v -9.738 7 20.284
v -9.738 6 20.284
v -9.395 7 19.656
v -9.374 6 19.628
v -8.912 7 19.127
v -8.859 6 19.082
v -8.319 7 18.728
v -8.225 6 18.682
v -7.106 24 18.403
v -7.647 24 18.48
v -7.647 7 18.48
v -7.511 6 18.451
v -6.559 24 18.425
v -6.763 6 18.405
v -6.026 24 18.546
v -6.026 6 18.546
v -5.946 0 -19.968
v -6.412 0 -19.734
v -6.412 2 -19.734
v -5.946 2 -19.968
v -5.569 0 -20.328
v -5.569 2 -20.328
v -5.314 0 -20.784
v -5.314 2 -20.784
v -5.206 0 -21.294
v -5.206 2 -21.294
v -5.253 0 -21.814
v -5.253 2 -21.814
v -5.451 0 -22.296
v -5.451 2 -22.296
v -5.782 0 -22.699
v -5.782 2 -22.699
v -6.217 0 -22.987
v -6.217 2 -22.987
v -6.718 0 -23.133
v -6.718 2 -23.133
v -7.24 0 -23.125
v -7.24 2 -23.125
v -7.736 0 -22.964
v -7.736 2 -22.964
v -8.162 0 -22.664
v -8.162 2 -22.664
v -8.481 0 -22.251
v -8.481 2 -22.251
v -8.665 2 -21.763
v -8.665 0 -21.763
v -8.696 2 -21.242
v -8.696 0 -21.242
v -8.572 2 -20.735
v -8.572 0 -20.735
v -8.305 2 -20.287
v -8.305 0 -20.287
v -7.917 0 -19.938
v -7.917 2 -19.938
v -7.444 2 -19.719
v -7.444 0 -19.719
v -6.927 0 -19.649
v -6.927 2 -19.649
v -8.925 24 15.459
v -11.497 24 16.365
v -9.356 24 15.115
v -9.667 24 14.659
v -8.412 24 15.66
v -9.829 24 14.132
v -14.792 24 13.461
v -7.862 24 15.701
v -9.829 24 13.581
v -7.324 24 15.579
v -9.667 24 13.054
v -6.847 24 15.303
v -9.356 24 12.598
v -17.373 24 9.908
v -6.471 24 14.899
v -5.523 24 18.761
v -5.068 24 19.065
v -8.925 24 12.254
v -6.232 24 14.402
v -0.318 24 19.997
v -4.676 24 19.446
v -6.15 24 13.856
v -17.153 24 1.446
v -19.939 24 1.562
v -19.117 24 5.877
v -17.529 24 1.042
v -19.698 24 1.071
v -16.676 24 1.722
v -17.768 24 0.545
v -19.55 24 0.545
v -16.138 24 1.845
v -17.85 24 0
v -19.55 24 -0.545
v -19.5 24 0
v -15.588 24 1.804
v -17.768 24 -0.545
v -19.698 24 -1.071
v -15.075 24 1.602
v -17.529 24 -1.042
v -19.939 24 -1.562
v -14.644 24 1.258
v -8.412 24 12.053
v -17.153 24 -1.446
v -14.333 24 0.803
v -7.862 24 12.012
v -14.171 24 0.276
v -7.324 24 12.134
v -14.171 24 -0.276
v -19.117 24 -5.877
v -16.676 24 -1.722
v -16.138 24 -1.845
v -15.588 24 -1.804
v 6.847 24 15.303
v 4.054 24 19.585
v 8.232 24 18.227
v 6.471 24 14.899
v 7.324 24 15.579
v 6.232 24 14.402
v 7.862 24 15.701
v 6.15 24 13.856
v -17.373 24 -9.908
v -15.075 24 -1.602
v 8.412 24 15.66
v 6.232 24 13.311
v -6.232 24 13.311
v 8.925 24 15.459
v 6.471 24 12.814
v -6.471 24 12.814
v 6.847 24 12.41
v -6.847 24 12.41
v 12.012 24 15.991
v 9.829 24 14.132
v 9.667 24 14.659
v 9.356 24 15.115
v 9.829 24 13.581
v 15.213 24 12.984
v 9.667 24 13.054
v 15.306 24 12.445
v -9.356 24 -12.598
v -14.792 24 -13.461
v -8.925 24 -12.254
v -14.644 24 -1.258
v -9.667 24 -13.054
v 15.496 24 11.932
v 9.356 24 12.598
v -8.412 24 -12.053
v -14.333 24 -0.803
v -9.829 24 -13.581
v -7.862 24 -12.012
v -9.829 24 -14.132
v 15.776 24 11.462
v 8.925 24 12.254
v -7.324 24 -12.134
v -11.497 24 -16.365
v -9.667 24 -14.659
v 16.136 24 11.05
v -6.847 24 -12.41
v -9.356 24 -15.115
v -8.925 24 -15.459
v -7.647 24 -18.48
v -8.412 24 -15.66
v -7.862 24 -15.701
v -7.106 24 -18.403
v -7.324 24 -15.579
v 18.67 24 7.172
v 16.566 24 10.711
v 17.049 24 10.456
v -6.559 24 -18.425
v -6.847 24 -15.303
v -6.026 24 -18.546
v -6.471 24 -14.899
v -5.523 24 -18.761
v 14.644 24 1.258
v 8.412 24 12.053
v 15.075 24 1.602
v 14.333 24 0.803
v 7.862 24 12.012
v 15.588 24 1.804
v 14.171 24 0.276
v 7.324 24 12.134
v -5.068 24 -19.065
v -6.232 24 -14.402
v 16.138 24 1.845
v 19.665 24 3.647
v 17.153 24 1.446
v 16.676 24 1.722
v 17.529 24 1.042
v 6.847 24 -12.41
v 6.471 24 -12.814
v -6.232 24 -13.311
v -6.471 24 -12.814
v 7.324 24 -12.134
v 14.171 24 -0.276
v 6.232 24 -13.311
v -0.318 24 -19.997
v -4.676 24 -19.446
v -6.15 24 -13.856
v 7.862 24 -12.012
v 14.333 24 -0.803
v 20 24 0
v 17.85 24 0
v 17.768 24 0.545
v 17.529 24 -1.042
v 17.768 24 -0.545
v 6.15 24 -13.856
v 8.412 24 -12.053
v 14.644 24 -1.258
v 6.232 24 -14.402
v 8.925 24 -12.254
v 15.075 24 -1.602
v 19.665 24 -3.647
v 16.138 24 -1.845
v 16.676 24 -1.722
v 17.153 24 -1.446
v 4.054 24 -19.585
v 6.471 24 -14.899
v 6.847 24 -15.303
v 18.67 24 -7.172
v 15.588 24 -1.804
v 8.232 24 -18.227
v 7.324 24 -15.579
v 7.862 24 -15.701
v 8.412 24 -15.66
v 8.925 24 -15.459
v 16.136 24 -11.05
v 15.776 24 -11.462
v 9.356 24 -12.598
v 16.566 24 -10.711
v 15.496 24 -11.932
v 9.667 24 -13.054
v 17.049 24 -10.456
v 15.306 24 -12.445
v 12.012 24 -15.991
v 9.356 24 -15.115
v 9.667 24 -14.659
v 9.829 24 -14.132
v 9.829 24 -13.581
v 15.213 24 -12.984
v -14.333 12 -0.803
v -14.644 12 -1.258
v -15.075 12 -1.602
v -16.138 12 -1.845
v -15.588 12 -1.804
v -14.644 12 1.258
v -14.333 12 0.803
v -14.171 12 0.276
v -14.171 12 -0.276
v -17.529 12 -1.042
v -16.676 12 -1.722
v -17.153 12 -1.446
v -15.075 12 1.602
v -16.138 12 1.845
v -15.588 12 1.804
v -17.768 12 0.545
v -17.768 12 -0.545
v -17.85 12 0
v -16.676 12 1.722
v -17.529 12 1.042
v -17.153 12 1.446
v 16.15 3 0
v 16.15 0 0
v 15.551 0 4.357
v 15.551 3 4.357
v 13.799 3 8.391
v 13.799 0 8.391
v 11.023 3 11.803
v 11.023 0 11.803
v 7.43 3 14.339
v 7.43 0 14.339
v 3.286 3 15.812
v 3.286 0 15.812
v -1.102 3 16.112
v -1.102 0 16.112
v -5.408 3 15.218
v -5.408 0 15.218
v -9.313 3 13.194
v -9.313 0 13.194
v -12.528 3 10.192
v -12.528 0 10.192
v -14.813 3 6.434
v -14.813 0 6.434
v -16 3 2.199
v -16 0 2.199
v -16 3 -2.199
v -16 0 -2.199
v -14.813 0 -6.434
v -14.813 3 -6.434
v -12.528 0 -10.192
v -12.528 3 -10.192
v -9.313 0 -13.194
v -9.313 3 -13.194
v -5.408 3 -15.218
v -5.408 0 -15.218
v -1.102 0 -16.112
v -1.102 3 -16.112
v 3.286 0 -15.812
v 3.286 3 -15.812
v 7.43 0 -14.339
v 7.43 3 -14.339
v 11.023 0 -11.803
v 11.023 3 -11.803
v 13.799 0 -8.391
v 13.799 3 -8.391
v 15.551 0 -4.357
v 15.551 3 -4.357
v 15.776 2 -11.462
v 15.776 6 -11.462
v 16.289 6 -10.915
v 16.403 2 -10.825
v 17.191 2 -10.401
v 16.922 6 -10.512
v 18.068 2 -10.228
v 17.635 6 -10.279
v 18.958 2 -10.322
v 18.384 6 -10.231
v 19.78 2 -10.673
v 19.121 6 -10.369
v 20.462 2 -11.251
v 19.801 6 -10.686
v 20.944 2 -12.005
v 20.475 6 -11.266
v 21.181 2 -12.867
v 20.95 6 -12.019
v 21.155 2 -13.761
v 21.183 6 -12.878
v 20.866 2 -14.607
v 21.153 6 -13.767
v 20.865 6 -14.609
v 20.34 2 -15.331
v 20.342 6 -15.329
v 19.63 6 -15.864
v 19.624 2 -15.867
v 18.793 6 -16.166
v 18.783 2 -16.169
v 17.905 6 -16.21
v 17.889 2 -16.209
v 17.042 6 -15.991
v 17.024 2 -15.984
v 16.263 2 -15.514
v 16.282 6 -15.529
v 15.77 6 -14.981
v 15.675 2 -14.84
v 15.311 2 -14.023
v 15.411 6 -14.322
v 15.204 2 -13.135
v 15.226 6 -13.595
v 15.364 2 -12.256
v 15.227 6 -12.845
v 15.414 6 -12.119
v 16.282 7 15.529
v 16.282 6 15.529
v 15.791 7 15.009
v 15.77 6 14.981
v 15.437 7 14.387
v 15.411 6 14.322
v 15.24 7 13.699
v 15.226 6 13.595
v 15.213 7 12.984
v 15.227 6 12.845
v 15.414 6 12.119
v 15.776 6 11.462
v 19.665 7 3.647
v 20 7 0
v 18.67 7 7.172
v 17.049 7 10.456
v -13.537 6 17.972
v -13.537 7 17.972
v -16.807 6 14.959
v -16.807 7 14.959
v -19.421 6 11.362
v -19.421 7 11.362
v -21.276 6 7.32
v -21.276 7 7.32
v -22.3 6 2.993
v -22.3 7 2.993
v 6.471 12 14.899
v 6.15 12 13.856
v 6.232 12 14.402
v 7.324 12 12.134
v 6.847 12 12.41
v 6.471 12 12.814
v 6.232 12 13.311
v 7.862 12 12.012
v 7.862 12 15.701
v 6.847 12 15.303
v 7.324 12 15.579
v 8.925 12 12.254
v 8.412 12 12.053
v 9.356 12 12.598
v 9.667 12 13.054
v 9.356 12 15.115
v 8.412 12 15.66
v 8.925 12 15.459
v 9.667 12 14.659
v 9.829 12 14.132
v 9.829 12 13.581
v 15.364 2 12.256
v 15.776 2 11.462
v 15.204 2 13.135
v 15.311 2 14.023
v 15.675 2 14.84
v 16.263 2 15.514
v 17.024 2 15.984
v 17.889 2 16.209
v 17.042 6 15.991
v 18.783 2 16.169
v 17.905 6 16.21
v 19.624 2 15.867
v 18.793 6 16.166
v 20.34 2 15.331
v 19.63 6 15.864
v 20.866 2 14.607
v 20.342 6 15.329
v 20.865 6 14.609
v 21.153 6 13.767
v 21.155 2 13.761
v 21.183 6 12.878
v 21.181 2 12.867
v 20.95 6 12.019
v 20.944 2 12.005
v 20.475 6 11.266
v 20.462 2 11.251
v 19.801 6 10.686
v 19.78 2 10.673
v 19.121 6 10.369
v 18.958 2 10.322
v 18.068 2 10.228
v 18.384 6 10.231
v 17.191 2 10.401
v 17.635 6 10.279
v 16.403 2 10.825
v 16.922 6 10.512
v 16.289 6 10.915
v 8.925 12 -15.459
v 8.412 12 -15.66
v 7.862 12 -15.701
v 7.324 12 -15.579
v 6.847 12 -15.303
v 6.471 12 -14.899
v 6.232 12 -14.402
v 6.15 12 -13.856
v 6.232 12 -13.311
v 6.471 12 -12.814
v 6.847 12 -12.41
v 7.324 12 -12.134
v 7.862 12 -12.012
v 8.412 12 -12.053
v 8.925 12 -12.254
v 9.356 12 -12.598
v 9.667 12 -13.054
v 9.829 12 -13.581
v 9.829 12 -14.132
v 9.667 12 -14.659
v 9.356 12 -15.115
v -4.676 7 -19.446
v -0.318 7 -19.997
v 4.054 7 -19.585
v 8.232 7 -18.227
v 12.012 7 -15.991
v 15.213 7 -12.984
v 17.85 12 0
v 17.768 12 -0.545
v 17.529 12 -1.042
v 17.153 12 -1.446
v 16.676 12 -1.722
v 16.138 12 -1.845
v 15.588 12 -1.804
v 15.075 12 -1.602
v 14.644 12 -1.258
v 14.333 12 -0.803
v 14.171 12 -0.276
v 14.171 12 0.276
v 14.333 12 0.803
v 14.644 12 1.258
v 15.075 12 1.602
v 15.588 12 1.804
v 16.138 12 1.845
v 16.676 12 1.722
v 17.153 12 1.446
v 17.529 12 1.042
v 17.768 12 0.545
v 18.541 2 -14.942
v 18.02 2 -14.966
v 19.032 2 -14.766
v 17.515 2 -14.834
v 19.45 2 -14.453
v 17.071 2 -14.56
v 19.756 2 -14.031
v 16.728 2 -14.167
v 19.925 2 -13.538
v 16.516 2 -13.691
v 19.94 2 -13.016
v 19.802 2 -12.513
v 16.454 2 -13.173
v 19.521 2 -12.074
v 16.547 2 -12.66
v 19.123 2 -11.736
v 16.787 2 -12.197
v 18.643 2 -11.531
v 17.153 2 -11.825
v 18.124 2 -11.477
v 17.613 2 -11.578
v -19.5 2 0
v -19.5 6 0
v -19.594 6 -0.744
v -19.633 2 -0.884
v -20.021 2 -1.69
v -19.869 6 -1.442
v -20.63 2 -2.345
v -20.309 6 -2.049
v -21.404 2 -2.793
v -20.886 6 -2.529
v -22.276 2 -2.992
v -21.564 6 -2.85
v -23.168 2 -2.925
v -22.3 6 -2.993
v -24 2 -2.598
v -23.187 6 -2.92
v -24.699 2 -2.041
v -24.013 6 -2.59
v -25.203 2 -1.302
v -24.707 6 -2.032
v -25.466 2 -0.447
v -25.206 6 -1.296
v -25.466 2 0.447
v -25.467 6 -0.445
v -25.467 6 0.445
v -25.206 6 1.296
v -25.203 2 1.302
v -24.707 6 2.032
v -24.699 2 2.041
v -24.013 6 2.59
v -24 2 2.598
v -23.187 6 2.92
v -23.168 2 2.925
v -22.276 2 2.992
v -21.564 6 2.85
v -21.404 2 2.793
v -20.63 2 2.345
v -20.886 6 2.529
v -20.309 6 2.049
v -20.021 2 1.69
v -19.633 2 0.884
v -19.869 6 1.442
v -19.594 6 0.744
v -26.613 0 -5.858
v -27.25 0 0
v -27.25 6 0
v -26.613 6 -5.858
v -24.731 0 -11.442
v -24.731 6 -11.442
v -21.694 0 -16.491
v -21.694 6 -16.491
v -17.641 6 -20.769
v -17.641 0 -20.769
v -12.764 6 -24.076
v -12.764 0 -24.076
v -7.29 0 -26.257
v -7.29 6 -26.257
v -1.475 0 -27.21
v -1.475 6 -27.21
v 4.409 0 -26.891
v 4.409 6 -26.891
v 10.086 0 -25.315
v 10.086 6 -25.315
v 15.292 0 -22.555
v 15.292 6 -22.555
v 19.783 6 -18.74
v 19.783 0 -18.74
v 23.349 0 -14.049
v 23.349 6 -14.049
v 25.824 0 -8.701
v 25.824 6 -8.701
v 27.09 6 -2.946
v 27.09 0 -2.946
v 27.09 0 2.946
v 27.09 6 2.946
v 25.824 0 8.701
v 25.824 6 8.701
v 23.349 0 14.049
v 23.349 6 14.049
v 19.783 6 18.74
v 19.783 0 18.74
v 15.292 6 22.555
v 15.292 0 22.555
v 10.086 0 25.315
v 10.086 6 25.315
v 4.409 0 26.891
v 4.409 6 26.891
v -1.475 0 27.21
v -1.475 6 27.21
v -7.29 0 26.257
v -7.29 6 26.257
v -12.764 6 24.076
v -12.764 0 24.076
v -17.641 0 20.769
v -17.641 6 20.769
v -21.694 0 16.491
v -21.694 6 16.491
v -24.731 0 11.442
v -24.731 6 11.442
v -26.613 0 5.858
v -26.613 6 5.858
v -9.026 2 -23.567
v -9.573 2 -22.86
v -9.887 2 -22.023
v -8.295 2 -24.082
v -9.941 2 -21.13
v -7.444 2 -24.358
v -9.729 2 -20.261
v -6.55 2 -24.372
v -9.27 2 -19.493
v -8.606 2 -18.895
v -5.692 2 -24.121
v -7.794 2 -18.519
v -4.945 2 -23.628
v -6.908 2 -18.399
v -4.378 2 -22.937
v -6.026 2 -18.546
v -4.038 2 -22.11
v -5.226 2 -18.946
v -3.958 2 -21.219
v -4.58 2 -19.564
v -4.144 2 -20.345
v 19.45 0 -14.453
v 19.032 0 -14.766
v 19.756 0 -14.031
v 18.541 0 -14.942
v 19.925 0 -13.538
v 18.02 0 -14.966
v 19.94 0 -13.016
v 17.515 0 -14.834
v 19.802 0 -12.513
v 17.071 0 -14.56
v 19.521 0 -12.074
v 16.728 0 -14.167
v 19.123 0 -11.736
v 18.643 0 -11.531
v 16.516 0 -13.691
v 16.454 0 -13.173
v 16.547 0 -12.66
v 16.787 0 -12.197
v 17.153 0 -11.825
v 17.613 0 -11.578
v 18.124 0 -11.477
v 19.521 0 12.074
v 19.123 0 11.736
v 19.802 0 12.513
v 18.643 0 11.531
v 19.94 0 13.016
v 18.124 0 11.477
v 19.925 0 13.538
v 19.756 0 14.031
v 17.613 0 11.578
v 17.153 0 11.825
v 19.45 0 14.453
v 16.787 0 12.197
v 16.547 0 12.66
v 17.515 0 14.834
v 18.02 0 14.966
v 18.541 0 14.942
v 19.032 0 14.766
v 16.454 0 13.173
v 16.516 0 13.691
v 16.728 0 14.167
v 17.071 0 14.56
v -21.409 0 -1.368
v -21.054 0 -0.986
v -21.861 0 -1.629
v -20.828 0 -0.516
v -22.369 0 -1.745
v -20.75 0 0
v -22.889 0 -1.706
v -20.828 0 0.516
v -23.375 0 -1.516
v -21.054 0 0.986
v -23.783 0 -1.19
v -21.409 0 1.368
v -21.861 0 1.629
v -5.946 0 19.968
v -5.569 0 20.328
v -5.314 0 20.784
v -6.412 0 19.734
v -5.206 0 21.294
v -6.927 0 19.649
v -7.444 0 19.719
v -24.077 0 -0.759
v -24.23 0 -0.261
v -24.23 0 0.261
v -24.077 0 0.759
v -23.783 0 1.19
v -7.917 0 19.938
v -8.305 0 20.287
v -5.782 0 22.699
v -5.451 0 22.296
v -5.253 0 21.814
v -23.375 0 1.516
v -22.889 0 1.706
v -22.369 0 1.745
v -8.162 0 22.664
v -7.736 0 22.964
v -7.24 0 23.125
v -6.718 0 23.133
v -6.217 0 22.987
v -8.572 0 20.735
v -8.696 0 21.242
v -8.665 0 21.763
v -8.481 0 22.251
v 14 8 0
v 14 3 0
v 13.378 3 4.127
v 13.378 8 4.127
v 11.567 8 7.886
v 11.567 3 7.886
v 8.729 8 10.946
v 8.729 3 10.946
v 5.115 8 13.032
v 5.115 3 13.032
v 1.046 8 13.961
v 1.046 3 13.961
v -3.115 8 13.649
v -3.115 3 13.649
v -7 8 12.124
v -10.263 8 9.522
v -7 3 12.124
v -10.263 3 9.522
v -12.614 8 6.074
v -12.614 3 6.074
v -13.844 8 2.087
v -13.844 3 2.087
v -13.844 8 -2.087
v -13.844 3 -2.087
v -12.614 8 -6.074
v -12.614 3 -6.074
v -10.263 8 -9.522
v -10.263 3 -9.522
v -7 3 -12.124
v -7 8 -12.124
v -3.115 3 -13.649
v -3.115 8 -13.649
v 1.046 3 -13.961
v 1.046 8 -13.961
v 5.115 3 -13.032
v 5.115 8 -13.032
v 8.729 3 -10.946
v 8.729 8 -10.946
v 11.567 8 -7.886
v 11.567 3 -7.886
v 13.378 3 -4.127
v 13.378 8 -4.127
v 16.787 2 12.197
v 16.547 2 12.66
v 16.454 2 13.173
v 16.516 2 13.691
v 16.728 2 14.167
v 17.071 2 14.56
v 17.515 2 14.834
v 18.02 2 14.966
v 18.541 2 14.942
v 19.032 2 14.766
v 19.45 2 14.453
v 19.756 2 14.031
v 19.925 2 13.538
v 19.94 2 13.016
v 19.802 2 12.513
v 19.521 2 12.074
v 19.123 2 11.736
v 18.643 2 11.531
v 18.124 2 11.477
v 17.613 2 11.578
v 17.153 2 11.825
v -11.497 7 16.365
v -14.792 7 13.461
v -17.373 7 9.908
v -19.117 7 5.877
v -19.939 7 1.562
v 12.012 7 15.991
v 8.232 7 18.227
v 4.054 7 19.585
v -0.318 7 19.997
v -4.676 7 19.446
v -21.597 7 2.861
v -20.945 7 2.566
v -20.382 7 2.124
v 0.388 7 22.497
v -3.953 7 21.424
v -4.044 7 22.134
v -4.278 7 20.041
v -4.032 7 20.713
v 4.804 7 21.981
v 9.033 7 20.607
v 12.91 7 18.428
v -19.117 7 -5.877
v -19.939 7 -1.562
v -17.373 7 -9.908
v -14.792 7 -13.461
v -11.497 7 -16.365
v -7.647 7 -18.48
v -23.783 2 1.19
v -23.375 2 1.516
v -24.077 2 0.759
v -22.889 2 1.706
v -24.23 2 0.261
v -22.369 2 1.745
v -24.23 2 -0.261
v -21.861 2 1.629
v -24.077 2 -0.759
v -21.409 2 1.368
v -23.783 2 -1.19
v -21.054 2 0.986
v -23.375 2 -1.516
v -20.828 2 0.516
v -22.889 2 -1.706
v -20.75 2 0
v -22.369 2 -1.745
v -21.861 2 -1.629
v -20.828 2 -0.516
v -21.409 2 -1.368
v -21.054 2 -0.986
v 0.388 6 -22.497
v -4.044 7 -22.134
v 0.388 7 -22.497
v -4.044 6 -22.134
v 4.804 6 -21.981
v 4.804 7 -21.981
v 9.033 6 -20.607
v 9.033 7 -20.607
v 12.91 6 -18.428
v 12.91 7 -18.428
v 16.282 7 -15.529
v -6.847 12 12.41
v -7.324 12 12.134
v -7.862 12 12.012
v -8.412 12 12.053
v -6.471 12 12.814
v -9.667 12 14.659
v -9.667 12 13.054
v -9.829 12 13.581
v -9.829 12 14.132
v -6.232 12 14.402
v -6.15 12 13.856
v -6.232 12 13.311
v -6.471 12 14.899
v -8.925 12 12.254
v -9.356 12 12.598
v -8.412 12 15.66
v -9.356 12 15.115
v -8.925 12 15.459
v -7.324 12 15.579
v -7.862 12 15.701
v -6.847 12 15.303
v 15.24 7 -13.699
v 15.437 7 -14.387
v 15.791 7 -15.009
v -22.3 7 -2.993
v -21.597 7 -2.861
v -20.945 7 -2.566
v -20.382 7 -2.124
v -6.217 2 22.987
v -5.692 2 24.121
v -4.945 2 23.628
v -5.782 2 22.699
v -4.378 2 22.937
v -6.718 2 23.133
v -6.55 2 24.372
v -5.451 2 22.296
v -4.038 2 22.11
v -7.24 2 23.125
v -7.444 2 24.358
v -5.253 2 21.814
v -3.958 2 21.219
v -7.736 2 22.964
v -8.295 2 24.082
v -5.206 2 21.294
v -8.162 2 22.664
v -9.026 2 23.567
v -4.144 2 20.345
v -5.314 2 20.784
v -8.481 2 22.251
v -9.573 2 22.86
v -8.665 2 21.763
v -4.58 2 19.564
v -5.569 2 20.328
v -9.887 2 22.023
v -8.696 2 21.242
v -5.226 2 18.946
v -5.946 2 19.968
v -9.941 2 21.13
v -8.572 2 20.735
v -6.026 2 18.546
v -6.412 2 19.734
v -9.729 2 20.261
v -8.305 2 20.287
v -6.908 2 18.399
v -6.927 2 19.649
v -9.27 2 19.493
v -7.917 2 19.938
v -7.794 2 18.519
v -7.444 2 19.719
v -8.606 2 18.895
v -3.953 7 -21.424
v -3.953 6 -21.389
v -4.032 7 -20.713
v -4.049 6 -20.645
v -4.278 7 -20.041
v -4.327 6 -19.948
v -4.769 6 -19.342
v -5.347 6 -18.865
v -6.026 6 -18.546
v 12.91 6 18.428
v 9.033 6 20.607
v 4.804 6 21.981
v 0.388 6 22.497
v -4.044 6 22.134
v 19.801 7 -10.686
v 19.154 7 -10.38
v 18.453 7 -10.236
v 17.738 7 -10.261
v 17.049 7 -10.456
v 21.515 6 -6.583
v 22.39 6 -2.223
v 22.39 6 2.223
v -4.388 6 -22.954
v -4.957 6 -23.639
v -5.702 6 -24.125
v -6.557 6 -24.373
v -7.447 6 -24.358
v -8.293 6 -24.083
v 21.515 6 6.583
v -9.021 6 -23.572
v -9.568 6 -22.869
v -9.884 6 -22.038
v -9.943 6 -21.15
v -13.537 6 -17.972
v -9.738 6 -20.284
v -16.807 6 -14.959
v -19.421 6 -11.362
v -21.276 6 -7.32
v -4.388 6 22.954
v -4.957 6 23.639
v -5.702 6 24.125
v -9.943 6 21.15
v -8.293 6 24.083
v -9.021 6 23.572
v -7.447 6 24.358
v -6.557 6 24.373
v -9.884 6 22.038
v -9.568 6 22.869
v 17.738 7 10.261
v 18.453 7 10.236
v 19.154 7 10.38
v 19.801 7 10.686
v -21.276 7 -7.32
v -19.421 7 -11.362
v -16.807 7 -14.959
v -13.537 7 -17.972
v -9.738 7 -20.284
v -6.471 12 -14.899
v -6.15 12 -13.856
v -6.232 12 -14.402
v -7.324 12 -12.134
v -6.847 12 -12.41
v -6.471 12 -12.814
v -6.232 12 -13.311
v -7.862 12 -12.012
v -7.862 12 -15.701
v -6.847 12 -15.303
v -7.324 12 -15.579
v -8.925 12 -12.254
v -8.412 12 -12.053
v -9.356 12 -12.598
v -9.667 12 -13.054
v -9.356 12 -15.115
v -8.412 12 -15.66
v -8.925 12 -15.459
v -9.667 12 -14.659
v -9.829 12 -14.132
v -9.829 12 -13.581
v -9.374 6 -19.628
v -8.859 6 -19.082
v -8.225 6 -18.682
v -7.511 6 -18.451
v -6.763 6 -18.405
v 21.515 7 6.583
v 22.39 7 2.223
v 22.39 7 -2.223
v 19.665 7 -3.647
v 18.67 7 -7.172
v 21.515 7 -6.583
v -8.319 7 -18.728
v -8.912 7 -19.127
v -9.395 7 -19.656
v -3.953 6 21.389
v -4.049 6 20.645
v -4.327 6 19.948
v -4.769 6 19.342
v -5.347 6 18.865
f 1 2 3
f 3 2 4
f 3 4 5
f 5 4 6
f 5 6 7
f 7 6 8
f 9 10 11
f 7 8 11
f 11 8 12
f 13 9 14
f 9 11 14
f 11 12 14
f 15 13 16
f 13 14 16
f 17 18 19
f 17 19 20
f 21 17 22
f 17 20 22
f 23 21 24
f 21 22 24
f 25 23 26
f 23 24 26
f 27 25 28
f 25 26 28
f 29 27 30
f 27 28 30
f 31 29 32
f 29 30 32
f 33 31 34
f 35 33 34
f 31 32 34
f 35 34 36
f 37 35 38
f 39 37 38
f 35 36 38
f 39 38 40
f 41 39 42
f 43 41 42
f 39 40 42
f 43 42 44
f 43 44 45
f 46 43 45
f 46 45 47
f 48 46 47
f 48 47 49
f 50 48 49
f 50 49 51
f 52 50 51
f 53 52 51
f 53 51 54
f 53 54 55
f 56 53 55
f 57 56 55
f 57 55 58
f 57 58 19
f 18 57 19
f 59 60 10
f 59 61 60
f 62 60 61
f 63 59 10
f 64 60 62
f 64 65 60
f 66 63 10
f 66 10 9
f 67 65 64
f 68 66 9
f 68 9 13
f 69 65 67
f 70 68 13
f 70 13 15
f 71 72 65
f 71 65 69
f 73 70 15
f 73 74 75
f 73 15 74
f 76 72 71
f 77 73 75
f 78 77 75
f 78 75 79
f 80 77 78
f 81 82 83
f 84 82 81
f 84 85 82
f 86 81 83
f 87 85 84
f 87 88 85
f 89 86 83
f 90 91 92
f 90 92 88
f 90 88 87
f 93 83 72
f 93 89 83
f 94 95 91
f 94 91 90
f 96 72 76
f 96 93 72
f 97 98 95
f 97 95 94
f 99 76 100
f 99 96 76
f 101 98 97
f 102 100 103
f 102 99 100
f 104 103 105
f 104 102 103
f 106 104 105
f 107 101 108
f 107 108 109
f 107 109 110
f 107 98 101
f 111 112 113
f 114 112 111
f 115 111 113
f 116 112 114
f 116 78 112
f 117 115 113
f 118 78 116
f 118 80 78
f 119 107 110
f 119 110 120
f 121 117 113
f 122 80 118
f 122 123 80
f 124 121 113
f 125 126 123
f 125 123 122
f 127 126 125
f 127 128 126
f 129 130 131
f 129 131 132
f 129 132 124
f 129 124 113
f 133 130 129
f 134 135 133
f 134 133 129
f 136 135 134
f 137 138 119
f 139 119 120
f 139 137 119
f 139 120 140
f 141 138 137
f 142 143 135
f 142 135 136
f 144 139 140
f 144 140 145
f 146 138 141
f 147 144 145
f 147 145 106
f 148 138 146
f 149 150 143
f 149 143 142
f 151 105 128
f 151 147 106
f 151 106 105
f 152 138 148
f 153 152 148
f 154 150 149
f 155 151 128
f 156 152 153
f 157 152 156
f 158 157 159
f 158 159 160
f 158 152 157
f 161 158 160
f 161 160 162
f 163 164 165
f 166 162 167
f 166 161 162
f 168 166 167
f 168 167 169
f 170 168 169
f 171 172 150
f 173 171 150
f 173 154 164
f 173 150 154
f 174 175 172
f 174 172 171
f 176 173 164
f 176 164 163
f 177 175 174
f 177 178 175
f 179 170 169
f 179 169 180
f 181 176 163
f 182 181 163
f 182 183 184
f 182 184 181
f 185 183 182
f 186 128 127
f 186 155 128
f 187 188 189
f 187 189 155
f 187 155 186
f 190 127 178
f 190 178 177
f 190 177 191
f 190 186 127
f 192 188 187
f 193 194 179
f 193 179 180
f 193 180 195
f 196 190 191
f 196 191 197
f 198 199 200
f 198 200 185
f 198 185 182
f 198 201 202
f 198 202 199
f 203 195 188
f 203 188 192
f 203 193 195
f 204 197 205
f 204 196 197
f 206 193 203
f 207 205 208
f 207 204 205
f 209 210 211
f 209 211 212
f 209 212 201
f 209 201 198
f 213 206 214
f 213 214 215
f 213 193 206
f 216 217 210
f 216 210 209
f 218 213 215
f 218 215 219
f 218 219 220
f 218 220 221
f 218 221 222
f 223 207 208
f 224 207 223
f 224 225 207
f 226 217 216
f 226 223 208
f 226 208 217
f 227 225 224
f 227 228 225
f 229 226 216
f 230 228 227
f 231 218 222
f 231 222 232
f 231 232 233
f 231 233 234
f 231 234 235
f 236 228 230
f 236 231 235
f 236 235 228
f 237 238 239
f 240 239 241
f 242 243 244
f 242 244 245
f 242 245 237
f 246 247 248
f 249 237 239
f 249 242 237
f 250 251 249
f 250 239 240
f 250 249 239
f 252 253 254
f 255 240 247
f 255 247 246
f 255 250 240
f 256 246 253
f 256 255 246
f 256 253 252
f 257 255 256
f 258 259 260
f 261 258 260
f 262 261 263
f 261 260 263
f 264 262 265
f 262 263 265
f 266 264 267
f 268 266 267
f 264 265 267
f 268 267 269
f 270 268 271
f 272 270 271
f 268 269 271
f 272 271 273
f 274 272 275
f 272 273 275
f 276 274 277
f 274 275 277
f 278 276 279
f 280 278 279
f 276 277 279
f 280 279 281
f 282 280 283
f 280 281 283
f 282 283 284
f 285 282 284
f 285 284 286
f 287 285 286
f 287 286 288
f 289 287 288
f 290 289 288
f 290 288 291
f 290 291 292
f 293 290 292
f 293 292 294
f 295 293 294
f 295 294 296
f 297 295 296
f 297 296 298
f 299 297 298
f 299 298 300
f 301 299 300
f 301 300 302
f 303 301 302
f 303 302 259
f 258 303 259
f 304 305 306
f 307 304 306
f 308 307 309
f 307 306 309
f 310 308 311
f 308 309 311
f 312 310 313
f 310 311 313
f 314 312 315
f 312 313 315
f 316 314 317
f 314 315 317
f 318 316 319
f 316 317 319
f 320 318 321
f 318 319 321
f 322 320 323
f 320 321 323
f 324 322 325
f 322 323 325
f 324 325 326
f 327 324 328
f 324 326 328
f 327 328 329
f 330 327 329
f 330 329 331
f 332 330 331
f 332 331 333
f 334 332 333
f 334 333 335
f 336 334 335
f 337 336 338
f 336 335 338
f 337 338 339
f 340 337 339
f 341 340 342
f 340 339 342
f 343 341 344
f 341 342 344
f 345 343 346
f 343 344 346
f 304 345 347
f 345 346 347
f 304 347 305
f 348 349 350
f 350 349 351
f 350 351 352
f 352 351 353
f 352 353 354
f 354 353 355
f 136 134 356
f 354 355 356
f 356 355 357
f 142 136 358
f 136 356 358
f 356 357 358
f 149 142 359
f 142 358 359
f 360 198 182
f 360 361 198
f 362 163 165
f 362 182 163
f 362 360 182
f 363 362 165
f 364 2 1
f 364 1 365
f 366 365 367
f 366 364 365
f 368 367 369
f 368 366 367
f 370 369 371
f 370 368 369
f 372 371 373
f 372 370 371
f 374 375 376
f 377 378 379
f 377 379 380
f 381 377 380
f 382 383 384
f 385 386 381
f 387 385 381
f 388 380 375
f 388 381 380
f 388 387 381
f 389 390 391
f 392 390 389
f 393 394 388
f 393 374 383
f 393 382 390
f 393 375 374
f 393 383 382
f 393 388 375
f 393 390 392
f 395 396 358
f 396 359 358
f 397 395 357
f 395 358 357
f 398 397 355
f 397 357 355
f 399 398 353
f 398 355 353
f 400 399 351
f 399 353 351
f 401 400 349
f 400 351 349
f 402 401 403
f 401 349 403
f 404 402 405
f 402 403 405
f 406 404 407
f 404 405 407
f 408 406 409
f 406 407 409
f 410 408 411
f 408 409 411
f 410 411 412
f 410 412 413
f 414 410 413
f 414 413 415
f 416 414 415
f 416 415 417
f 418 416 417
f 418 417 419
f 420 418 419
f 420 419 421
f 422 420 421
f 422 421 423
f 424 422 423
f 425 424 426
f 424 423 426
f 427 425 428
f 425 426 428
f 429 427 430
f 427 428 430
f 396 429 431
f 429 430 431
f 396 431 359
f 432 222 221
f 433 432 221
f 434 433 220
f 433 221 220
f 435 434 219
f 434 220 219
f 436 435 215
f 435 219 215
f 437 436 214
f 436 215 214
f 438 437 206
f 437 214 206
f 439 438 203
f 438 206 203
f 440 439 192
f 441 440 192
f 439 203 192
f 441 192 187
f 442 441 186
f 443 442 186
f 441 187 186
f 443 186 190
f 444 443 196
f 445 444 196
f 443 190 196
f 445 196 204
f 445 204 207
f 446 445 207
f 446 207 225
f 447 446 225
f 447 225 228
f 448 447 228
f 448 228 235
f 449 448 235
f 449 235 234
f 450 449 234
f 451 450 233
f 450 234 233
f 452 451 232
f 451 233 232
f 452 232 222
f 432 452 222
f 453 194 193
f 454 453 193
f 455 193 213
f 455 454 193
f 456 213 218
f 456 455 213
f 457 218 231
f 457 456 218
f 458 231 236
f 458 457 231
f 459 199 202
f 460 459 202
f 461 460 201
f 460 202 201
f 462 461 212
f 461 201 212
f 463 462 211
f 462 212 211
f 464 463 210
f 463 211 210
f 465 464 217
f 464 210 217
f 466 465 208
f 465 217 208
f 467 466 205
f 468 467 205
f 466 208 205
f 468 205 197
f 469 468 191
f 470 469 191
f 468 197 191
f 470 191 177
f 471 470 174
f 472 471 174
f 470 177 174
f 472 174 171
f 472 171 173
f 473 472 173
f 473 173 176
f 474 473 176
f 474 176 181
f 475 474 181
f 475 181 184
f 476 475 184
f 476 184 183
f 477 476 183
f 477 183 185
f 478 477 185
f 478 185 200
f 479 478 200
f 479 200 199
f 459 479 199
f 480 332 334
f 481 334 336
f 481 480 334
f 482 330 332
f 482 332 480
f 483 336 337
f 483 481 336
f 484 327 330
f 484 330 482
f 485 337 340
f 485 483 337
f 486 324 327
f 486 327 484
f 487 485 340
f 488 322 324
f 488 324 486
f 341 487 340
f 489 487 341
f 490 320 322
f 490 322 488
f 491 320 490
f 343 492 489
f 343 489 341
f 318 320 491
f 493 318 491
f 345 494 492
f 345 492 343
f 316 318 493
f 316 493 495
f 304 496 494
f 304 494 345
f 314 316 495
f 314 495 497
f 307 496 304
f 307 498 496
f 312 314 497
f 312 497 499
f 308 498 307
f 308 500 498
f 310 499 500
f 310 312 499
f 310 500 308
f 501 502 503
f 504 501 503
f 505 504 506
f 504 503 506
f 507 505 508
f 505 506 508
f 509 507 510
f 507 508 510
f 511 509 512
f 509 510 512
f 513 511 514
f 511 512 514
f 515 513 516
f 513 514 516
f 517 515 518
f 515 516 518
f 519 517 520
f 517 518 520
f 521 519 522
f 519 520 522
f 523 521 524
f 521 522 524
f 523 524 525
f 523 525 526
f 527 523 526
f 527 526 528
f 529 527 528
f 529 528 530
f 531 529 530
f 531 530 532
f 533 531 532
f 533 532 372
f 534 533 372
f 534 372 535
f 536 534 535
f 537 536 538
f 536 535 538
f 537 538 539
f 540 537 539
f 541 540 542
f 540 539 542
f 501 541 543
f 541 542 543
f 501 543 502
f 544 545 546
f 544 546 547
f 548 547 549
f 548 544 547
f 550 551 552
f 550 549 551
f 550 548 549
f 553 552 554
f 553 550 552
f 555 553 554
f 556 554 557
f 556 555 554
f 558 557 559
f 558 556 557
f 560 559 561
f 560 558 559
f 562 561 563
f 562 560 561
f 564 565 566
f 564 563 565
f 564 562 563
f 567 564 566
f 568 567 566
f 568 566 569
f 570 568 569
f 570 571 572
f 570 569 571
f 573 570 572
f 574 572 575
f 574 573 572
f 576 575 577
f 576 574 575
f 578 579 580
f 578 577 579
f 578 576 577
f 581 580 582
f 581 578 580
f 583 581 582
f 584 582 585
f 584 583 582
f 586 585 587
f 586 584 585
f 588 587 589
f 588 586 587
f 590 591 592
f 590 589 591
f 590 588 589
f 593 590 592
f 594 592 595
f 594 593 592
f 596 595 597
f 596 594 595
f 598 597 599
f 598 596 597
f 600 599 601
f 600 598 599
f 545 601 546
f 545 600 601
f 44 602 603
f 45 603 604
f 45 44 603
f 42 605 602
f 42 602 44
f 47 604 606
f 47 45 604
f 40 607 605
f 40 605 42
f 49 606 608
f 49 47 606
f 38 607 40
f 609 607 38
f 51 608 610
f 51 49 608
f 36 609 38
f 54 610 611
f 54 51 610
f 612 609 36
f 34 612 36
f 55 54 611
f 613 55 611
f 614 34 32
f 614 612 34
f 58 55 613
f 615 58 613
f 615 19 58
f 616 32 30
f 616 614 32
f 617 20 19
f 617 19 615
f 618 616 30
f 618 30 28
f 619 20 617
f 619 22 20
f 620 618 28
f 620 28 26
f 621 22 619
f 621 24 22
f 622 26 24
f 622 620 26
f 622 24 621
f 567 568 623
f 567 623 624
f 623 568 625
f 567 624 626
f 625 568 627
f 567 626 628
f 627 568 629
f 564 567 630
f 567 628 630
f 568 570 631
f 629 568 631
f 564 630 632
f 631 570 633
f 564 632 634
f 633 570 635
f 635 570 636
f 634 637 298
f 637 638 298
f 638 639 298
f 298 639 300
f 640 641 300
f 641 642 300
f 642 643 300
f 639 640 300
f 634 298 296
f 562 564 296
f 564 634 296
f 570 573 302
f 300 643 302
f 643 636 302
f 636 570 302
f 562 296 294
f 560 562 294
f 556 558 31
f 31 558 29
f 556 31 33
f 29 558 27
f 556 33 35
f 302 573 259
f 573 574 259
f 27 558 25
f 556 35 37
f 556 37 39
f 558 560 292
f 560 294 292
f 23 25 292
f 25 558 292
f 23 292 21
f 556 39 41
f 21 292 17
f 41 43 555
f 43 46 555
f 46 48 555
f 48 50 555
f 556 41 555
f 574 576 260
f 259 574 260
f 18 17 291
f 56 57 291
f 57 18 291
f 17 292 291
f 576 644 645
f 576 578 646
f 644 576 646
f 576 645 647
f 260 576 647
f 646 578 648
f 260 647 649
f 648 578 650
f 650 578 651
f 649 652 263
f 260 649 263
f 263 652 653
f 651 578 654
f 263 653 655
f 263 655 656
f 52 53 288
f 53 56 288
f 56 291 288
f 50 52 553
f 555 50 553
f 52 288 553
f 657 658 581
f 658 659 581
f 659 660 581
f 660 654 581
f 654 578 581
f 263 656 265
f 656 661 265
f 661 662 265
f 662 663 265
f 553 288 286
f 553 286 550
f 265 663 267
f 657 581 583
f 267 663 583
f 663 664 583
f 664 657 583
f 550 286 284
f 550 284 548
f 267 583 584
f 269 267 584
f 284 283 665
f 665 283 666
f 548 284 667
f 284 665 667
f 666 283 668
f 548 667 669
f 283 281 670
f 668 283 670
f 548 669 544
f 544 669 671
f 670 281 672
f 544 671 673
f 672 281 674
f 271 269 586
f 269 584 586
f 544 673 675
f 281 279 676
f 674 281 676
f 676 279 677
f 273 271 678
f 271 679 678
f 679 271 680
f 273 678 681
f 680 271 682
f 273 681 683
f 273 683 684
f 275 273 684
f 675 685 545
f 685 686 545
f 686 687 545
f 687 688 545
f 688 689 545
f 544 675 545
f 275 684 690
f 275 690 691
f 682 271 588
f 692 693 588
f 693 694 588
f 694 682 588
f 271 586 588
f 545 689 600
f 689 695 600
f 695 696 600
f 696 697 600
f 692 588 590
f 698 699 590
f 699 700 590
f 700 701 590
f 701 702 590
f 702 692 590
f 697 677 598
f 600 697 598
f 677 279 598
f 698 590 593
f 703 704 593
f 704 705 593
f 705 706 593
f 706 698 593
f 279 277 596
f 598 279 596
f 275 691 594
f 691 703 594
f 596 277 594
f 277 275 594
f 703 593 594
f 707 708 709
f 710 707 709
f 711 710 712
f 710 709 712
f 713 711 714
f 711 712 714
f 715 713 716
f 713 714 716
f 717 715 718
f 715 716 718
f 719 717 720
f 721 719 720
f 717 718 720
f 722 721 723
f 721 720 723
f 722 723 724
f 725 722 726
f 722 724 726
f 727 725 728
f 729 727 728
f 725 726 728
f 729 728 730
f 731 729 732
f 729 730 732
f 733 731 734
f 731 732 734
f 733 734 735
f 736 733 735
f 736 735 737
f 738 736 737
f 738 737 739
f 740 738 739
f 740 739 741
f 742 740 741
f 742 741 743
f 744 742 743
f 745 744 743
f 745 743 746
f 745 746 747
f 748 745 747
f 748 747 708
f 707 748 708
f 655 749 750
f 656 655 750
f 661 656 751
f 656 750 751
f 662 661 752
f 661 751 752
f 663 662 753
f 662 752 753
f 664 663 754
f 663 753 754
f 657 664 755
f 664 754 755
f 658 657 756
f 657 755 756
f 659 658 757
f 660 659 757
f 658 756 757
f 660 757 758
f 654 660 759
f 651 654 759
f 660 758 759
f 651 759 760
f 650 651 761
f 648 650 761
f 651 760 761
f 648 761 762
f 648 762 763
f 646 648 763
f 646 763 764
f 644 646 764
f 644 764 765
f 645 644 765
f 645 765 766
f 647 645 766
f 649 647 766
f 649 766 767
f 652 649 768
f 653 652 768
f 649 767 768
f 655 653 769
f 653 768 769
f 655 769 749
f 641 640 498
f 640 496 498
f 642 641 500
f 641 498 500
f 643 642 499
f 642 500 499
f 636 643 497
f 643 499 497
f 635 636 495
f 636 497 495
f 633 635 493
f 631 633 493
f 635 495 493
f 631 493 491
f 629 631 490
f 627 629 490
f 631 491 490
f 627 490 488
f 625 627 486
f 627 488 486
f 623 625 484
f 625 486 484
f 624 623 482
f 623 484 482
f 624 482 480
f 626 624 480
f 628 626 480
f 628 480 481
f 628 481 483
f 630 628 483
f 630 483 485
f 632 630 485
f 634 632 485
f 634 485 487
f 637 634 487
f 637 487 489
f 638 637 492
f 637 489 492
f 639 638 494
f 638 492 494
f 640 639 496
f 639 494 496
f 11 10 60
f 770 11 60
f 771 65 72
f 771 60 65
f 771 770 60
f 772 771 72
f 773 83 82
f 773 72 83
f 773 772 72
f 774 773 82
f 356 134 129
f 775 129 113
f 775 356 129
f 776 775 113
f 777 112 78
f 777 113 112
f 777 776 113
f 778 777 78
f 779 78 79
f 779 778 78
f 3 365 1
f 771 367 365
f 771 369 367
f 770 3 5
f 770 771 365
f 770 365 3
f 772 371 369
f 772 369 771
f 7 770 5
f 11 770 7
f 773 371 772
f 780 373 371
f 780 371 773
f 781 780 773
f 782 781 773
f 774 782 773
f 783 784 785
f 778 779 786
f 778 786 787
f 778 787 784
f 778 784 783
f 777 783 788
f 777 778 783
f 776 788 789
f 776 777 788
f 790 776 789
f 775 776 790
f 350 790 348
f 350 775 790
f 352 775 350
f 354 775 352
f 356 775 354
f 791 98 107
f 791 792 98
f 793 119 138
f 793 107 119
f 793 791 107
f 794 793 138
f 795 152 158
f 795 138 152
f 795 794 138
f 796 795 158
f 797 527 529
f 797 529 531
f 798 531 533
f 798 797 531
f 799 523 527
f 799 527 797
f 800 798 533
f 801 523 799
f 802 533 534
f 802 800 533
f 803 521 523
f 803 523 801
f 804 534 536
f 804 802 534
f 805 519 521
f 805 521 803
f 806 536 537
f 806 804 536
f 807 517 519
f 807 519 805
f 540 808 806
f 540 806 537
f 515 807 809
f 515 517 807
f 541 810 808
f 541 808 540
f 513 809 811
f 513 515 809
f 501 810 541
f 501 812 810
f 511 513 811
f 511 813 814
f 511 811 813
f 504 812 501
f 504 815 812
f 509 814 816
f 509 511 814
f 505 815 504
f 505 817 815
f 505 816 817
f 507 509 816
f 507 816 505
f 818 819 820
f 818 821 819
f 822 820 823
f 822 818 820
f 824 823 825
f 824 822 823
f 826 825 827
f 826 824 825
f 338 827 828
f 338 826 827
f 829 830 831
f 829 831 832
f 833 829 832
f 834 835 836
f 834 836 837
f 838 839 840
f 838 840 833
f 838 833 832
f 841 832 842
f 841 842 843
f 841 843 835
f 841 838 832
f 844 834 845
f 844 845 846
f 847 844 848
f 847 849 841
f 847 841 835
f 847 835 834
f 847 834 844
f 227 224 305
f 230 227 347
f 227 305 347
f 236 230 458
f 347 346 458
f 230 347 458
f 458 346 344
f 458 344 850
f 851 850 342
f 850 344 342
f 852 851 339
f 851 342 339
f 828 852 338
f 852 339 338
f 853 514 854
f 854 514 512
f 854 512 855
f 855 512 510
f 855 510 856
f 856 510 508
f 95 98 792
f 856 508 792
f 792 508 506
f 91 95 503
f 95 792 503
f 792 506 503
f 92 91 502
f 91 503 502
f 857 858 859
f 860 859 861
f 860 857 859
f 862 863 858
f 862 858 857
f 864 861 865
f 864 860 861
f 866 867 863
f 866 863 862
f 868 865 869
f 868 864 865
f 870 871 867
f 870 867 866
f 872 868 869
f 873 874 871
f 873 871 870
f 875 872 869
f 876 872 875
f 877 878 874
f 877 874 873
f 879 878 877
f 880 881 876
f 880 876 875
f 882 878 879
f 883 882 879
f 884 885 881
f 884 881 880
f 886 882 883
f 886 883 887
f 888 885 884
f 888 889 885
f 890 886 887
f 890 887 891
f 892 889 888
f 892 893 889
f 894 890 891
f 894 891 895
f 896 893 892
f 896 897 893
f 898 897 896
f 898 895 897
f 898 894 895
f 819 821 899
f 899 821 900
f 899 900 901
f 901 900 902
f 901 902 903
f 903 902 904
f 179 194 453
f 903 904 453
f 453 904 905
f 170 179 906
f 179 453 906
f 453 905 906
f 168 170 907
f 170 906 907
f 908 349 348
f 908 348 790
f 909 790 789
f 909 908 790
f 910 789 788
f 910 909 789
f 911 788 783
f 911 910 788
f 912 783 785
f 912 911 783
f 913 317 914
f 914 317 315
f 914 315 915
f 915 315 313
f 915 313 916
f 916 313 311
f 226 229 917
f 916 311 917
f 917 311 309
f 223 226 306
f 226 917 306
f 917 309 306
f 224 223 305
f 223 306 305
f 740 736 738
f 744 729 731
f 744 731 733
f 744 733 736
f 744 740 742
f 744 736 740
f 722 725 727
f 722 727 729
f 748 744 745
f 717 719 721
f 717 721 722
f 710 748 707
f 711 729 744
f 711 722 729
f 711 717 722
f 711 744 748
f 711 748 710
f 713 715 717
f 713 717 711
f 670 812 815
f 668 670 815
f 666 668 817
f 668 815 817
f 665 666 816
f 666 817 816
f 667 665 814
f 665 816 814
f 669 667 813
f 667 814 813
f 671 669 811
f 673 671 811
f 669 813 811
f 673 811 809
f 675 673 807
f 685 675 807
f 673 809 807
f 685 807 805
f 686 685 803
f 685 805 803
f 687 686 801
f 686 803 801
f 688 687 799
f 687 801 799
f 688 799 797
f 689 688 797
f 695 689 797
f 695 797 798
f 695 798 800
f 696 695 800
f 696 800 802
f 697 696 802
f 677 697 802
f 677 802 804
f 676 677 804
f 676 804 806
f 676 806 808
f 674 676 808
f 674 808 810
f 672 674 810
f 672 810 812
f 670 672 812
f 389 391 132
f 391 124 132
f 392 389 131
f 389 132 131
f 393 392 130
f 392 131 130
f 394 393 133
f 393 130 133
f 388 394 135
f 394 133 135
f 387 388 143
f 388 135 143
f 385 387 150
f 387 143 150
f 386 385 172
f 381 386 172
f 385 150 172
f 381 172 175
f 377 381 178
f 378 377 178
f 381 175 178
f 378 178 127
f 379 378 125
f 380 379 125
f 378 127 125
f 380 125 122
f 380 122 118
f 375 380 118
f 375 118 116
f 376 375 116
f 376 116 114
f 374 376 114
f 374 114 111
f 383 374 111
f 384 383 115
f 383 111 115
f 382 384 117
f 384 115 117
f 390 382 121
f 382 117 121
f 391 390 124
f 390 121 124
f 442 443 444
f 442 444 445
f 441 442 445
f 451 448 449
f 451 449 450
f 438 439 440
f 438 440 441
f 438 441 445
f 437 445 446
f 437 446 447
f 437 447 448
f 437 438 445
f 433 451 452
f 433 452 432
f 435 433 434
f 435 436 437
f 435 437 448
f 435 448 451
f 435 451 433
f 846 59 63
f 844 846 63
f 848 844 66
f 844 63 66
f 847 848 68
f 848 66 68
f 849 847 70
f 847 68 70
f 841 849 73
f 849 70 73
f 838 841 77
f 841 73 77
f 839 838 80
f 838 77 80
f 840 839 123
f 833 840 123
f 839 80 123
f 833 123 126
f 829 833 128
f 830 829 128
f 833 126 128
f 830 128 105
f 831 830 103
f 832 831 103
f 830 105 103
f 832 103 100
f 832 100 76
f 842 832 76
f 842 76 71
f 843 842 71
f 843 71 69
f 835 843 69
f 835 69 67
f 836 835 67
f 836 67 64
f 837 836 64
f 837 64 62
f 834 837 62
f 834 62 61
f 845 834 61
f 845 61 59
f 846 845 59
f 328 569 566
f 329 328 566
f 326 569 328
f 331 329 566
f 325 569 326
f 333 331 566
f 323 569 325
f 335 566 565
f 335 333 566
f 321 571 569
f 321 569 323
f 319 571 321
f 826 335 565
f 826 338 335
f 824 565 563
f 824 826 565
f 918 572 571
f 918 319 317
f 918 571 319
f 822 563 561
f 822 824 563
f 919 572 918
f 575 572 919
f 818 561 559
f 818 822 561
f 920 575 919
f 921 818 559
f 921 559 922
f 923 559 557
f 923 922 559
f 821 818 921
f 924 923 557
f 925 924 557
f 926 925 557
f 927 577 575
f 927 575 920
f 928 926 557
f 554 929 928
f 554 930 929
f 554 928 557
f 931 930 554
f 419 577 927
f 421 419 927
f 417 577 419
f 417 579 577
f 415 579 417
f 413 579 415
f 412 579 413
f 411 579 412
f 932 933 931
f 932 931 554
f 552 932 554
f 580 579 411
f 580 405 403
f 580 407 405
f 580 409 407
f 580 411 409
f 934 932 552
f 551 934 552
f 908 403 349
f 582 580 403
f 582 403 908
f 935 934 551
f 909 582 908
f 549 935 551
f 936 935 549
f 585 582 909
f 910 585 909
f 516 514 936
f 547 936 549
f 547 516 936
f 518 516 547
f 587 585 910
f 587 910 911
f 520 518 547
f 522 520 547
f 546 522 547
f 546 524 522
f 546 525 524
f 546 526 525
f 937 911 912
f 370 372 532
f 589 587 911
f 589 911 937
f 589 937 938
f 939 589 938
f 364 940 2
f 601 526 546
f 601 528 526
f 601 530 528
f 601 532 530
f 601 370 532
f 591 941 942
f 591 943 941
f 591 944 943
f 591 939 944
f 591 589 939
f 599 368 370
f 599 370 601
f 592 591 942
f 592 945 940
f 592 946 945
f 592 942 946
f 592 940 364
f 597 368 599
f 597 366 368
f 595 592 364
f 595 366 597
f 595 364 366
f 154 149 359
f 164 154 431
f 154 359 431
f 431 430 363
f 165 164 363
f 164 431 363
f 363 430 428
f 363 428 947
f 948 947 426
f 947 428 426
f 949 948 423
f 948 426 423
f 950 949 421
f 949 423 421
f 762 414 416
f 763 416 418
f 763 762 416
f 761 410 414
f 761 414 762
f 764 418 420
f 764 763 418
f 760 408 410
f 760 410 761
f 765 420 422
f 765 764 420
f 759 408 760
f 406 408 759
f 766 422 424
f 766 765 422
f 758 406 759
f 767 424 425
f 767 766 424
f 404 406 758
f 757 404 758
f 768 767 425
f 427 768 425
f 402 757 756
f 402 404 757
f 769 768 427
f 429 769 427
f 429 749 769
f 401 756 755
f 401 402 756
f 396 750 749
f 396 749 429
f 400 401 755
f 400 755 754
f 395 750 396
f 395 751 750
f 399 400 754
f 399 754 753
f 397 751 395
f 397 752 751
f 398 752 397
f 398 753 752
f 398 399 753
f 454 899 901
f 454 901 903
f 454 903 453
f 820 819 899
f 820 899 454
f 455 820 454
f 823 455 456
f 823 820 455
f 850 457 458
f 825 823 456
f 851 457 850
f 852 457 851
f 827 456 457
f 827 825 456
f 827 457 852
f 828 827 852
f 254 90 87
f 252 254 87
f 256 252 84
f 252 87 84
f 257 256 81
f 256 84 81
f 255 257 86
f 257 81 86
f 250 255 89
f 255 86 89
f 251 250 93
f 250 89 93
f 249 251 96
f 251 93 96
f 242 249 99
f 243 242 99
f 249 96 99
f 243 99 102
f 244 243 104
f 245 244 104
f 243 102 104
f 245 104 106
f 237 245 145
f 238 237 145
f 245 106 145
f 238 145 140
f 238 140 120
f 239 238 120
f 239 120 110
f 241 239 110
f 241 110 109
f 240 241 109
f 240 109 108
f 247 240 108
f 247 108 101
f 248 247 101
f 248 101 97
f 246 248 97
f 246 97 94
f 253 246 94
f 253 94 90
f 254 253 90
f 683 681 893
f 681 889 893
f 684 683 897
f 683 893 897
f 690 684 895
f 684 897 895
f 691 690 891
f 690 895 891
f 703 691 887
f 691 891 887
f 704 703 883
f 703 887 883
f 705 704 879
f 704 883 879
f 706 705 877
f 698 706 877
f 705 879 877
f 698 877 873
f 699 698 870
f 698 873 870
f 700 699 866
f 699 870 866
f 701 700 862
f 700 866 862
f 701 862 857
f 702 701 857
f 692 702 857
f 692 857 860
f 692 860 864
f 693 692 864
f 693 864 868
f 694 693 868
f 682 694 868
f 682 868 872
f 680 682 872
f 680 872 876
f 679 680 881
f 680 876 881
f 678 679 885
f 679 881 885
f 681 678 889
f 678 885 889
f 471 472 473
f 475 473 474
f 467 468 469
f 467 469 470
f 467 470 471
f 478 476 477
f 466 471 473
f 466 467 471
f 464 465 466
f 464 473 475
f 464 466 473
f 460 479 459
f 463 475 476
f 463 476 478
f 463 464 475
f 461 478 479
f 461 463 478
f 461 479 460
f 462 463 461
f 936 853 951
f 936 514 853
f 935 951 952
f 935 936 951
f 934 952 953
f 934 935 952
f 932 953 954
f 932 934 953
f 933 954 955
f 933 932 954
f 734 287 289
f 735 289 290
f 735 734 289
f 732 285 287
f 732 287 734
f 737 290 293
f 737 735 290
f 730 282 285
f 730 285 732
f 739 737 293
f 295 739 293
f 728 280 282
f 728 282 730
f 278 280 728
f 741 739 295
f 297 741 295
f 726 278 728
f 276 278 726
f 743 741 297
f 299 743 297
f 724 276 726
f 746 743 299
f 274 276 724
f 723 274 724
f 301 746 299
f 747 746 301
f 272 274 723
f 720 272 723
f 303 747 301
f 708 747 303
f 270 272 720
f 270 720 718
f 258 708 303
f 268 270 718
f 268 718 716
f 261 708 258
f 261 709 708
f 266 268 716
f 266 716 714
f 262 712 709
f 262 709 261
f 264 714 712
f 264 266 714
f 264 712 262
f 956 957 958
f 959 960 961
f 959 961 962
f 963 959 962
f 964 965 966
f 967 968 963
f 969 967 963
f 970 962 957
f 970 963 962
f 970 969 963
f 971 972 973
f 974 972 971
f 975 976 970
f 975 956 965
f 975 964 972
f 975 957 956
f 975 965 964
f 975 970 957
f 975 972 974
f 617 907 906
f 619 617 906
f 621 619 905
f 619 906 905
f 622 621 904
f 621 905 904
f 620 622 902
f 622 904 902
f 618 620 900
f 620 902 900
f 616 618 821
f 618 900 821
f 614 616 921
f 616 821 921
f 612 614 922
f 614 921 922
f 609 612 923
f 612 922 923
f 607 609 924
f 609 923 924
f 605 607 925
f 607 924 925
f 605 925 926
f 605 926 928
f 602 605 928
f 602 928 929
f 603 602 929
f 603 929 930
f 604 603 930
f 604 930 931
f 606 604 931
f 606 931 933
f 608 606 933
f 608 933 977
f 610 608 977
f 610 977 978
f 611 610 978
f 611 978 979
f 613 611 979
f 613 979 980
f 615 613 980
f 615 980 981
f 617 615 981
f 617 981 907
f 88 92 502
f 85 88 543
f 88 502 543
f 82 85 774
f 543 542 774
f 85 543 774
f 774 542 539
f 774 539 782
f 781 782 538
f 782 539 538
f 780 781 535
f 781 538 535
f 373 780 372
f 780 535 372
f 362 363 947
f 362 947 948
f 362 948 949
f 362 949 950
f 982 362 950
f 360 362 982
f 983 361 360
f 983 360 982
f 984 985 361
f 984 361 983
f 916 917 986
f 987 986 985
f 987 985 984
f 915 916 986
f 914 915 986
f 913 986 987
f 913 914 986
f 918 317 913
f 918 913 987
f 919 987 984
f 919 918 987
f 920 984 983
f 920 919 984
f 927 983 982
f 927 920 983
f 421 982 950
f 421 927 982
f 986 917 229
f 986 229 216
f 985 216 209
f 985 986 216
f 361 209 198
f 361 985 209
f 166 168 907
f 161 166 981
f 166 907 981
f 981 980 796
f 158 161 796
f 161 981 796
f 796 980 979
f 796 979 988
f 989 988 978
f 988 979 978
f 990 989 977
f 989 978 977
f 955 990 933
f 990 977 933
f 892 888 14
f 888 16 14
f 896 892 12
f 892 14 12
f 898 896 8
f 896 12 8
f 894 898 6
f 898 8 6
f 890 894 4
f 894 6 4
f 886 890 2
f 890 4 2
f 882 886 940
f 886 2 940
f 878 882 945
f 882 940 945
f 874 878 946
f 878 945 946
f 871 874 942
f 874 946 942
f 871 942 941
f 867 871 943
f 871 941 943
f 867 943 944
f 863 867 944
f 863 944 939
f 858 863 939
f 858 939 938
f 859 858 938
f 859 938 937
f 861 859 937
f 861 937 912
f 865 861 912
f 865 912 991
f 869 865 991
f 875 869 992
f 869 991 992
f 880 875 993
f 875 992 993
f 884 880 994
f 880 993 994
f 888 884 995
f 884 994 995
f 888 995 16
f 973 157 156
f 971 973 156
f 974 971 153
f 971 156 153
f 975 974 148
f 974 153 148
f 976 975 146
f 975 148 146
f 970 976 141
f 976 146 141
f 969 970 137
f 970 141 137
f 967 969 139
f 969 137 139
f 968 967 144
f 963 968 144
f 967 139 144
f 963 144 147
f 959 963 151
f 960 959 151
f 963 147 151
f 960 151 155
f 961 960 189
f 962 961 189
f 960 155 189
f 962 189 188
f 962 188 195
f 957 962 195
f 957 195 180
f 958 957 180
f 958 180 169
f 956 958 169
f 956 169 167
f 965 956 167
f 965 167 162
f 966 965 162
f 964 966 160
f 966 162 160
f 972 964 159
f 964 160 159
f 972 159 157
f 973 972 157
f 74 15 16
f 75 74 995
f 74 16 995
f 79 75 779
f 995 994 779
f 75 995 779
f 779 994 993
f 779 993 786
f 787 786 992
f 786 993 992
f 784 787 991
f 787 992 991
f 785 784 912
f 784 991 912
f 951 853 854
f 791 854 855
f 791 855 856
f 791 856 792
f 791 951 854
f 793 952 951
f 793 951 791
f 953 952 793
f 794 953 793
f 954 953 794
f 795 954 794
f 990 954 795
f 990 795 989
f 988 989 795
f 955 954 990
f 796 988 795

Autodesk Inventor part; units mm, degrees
ref_plane "YZ Plane" through (0, 0, 0) normal (1, 0, 0) x (0, 1, 0)
ref_plane "XZ Plane" through (0, 0, 0) normal (0, 1, 0) x (-1, 0, 0)
ref_plane "XY Plane" through (0, 0, 0) normal (0, 0, 1) x (1, 0, 0)
sketch "Szkic1" plane through (0, 0, 0) normal (0, 1, 0) x (-1, 0, 0)
  circle A0 centre (0, 0) radius 27.25
  dimension "d0" = 54.5
extrude "Wyciągnięcie proste1" add sketch "Szkic1" along normal blind 6
sketch "Szkic2" plane through (0, 6, 0) normal (0, 1, 0) x (1, 0, 0)
  circle A0 centre (0, 0) radius 22.5
  dimension "d3" = 45
extrude "Wyciągnięcie proste2" add sketch "Szkic2" along normal blind 1
sketch "Szkic3" plane through (0, 7, 0) normal (0, 1, 0) x (1, 0, 0)
  circle A0 centre (0, 0) radius 20
  dimension "d6" = 40
extrude "Wyciągnięcie proste3" add sketch "Szkic3" along normal blind 17
sketch "Szkic4" plane through (0, 6, 0) normal (0, 1, 0) x (1, 0, 0)
  circle A0 centre (-22.5, 0) radius 3
  point P0 (0, 0)
  dimension "d9" = 6
  dimension "d10" = 22.5
extrude "Wyciągnięcie proste4" cut sketch "Szkic4" along normal blind 18 and the other way blind 4
sketch "Szkic5" plane through (-22.5, 2, 0) normal (0, 1, 0) x (1, 0, 0)
  circle A0 centre (0, 0) radius 1.75
  point P0 (22.5, 0)
  dimension "d15" = 3.5
extrude "Wyciągnięcie proste5" cut sketch "Szkic5" against normal up to surface (2 mm away)
pattern_circular "Szyk kołowy1" count 5 over 360 about axis through (0, 0, 0) along (0, 1, 0) of "Wyciągnięcie proste4", "Wyciągnięcie proste5"
sketch "Szkic6" plane through (0, 0, 0) normal (0, -1, 0) x (1, 0, 0)
  circle A0 centre (0, 0) radius 16.15
  dimension "d21" = 32.3
extrude "Wyciągnięcie proste6" cut sketch "Szkic6" against normal blind 3
sketch "Szkic7" plane through (0, 3, 0) normal (0, -1, 0) x (1, 0, 0)
  circle A0 centre (0, 0) radius 14
  dimension "d24" = 28
extrude "Wyciągnięcie proste7" cut sketch "Szkic7" against normal blind 5
sketch "Sketch8" plane through (0, 24, 0) normal (0, 1, 0) x (1, 0, 0)
  circle A0 centre (0, 0) radius 16.15 projected
  circle A1 centre (16, 0) radius 1.85
  dimension "d27" = 3.7
  dimension "d28" = 16
extrude "Extrusion8" cut sketch "Sketch8" against normal blind 12 contours A0 A1 | A0 A1 picked at (15.5207, 0.4277) picked at (16.6977, 0.3411)
pattern_circular "Circular Pattern2" count 6 over 360 about axis through (0, 7, 0) along (0, 1, 0) of "Extrusion8"
properties part number "OutputShaft2_3DPrint"
